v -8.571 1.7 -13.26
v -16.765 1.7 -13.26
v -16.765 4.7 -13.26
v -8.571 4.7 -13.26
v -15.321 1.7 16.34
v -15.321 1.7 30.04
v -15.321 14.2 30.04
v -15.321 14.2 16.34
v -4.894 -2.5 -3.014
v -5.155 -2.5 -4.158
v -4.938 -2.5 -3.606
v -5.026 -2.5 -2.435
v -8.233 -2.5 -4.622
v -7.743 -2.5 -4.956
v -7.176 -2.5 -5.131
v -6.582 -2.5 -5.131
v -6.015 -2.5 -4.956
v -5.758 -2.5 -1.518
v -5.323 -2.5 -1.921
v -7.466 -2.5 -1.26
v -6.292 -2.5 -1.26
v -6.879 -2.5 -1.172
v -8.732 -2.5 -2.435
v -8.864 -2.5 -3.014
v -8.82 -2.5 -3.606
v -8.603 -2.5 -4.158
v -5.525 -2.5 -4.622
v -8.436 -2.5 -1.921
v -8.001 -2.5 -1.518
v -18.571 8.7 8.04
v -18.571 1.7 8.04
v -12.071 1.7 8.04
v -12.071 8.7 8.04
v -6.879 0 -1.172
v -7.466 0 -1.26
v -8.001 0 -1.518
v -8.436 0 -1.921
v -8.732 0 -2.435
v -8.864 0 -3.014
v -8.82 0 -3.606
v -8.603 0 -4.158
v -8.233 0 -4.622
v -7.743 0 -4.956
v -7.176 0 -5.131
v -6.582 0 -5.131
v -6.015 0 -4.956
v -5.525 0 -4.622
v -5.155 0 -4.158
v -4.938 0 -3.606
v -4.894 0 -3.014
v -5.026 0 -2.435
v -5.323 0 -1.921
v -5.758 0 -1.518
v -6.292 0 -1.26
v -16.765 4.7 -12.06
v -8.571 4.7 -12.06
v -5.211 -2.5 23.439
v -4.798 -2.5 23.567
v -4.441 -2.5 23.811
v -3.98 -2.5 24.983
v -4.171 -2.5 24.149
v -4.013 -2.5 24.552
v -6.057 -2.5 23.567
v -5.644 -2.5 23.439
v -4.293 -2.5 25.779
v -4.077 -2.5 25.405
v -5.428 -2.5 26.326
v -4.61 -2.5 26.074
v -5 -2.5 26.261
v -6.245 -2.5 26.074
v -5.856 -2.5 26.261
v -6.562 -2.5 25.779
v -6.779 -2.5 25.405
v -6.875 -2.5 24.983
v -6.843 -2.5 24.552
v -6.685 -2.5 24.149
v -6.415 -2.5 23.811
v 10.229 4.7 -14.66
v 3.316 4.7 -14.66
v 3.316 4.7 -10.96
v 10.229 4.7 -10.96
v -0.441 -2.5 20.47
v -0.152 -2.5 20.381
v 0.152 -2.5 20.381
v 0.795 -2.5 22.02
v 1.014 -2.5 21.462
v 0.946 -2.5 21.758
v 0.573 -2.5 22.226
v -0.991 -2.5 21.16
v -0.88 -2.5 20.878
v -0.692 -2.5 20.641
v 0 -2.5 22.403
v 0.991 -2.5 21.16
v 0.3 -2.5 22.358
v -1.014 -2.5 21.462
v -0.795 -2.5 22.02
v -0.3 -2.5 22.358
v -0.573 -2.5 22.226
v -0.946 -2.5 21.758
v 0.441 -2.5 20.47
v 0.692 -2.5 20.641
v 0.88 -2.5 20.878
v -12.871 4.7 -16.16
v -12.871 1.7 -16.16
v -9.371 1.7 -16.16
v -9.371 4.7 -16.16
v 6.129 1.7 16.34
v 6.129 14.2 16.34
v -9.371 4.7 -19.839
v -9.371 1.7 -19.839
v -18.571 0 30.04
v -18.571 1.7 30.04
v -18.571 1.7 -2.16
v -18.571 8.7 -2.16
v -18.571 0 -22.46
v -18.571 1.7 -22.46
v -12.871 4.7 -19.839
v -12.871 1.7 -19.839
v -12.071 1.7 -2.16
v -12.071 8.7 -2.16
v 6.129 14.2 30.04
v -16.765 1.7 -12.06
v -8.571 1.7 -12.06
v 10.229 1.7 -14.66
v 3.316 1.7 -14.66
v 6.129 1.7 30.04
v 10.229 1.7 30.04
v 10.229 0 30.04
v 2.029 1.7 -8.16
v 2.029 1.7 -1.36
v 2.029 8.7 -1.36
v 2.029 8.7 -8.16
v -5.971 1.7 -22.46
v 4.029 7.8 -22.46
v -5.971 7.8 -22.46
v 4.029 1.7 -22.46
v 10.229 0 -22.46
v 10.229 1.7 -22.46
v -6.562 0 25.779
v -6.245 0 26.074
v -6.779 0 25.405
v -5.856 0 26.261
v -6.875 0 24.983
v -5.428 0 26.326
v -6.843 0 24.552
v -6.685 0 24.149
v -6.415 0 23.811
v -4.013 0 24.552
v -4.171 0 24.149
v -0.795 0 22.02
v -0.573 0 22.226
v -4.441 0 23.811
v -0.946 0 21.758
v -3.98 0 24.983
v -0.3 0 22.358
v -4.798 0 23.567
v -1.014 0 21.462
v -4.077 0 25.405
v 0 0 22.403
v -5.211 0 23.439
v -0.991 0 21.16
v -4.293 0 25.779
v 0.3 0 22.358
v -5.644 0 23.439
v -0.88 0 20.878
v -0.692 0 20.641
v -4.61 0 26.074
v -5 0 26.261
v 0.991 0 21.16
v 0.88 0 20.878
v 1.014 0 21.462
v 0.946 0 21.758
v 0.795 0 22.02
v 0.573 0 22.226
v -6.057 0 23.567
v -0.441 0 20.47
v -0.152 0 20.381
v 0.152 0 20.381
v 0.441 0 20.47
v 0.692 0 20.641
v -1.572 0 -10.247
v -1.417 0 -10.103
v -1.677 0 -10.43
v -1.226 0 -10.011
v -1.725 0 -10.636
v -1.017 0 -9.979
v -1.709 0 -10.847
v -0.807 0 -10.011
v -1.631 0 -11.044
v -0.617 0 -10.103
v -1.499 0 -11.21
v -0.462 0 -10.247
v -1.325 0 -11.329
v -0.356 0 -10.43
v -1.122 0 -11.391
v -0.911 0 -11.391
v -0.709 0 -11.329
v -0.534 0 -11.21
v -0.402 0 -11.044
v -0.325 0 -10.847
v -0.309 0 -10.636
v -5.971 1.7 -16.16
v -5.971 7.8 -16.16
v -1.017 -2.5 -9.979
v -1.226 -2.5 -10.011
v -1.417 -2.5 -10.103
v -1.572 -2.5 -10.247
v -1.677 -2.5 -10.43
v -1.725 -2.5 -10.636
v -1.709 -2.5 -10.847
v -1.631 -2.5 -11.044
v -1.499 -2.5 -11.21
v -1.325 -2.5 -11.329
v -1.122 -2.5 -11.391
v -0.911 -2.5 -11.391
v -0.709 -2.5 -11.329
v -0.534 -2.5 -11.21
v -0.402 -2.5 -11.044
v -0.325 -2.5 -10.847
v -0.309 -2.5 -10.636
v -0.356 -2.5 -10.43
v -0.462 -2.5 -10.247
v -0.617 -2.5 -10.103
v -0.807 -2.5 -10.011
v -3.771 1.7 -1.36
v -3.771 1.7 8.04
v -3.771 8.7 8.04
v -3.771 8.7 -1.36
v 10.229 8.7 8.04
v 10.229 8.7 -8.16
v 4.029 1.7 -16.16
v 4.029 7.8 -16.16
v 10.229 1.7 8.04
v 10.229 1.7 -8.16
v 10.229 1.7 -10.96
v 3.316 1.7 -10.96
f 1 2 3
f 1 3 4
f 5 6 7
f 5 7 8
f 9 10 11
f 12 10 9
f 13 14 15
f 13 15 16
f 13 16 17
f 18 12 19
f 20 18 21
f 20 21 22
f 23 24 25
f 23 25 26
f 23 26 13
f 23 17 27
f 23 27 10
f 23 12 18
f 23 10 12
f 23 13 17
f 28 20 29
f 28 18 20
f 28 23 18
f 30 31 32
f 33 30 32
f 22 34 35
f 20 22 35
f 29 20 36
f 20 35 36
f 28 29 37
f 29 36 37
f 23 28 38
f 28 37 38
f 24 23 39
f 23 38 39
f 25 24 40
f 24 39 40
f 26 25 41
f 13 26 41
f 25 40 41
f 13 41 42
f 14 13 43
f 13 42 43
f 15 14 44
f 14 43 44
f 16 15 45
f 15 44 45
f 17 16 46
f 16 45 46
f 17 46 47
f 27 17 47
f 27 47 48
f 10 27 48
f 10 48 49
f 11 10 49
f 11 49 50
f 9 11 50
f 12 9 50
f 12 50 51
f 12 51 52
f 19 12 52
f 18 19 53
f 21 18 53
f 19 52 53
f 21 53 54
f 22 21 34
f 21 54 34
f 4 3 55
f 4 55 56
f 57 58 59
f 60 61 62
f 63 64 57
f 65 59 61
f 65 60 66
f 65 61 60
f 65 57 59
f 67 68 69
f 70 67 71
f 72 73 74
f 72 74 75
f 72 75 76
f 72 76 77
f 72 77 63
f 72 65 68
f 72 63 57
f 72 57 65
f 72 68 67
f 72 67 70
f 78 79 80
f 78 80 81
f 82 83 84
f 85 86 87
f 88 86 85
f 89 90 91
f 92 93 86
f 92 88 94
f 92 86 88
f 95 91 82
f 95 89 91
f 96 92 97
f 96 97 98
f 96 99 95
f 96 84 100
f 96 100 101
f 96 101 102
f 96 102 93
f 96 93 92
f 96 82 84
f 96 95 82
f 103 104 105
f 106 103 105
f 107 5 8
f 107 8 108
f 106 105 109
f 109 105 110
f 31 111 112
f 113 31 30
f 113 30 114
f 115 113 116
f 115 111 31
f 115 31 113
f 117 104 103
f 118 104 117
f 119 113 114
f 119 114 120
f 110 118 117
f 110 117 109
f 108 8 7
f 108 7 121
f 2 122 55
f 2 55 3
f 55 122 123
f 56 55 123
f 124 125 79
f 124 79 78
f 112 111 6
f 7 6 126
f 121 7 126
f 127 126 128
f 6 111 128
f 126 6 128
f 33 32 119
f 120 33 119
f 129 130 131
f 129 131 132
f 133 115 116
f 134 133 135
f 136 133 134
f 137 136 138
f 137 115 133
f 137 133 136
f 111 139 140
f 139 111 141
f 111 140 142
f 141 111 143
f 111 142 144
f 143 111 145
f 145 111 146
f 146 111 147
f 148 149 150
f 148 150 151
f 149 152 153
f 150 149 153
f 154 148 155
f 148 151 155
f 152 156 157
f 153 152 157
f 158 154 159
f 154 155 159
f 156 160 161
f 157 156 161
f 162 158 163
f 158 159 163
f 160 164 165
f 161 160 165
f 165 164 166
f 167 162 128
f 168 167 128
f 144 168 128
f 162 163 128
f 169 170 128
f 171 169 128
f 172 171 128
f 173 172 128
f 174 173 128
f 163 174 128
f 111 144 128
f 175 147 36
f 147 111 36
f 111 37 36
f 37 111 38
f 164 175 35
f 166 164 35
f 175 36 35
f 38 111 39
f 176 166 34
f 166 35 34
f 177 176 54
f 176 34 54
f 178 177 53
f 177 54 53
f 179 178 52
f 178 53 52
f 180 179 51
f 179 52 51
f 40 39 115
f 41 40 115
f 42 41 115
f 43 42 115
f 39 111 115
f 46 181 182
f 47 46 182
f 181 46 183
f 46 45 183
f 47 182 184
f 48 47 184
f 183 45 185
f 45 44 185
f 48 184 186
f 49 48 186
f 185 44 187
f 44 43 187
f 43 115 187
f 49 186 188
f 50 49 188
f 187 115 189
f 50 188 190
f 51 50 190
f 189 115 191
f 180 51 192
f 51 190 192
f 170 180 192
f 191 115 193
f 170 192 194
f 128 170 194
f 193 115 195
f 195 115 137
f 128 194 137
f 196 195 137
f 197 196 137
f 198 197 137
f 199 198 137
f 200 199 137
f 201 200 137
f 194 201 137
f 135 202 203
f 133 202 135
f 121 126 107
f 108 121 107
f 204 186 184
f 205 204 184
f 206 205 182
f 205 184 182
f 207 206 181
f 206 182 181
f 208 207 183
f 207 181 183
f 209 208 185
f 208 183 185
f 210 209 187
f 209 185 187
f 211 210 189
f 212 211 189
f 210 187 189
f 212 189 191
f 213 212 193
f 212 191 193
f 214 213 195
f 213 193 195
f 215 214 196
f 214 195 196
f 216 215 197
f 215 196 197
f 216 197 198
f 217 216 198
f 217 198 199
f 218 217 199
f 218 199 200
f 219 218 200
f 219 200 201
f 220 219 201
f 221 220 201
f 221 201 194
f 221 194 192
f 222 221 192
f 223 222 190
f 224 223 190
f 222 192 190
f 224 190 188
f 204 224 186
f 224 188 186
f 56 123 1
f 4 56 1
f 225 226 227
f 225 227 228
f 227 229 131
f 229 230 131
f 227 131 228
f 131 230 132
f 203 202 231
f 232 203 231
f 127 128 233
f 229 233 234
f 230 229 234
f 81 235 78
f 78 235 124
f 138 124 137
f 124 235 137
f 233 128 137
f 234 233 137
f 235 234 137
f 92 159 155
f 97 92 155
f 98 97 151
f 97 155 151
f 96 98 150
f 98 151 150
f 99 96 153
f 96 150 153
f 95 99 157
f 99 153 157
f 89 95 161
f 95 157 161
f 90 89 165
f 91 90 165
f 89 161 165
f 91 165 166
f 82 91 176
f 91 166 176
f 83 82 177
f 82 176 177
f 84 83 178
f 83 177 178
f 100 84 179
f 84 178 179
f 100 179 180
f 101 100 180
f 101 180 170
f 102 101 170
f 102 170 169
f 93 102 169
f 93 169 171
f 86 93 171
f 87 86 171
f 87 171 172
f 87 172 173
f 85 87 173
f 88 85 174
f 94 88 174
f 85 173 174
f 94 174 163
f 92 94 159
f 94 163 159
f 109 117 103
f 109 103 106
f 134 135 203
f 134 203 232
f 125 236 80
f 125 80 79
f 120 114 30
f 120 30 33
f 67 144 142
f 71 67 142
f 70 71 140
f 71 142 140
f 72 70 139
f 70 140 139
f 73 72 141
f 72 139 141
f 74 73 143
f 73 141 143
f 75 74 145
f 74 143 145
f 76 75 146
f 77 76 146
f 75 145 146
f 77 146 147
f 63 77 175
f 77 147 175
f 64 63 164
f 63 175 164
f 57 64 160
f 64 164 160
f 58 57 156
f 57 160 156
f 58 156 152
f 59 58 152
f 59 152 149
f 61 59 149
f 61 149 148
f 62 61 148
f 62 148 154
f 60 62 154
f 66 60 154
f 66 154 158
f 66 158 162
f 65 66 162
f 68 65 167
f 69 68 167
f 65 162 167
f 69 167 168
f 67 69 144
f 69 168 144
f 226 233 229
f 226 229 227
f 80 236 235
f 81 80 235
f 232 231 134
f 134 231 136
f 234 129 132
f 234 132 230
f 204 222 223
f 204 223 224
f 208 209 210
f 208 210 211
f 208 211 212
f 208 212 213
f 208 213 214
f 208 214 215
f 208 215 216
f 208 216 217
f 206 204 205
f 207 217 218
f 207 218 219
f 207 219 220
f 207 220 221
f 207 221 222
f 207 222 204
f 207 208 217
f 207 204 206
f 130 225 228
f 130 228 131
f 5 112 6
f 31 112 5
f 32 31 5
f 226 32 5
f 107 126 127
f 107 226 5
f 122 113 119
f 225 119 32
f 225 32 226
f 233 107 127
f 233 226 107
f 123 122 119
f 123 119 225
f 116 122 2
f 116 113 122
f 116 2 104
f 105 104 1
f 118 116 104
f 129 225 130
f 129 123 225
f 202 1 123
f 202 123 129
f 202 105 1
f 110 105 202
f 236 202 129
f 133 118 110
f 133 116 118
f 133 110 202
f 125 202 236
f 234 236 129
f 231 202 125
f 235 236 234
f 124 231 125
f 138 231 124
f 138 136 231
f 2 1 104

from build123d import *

# Parameters (mm, degrees)
SZKIC1_W                    = 28.8
SZKIC1_H                    = 52.5
DODANIE_WYCI_GNI_CIE1_DEPTH = 1.7
SZKIC2_W                    = 21.45
SZKIC2_H                    = 13.7
DODANIE_WYCI_GNI_CIE2_DEPTH = 12.5
SZKIC3_W                    = 10
SZKIC3_H                    = 6.3
DODANIE_WYCI_GNI_CIE3_DEPTH = 6.1
SZKIC4_W                    = 6.912979227
SZKIC4_H                    = 3.7
DODANIE_WYCI_GNI_CIE4_DEPTH = 3
SZKIC5_R                    = 1.451396222
SZKIC5_R_2                  = 1.016690736
SZKIC5_R_3                  = 1.990845458
SZKIC5_R_4                  = 0.709805555
DODANIE_WYCI_GNI_CIE5_DEPTH = 2.5
SZKIC6_W                    = 3.5
SZKIC6_H                    = 3.678360942
DODANIE_WYCI_GNI_CIE6_DEPTH = 3
SZKIC7_W                    = 8.193889987
SZKIC7_H                    = 1.2
DODANIE_WYCI_GNI_CIE7_DEPTH = 3
SZKIC8_W                    = 6.5
SZKIC8_H                    = 10.2
DODANIE_WYCI_GNI_CIE8_DEPTH = 7


with BuildPart() as part:
    # Szkic1 → Dodanie-wyciągnięcie1 (new body)
    with BuildSketch(Plane(origin=(0, 0, 0), x_dir=(1, 0, 0), z_dir=(0, 1, 0))):
        with Locations((-4.171428571, -3.78968254)):
            Rectangle(SZKIC1_W, SZKIC1_H)
    extrude(amount=DODANIE_WYCI_GNI_CIE1_DEPTH)

    # Szkic2 → Dodanie-wyciągnięcie2 (add)
    with BuildSketch(Plane(origin=(0, 1.7, 0), x_dir=(1, 0, 0), z_dir=(0, 1, 0))):
        with Locations((-4.596428571, -23.18968254)):
            Rectangle(SZKIC2_W, SZKIC2_H)
    extrude(amount=DODANIE_WYCI_GNI_CIE2_DEPTH)

    # Szkic3 → Dodanie-wyciągnięcie3 (add)
    with BuildSketch(Plane(origin=(0, 1.7, 0), x_dir=(1, 0, 0), z_dir=(0, 1, 0))):
        with Locations((-0.971428571, 19.31031746)):
            Rectangle(SZKIC3_W, SZKIC3_H)
    extrude(amount=DODANIE_WYCI_GNI_CIE3_DEPTH)

    # Szkic4 → Dodanie-wyciągnięcie4 (add)
    with BuildSketch(Plane(origin=(0, 1.7, 0), x_dir=(1, 0, 0), z_dir=(0, 1, 0))):
        with Locations((6.772081815, 12.81031746)):
            Rectangle(SZKIC4_W, SZKIC4_H)
    extrude(amount=DODANIE_WYCI_GNI_CIE4_DEPTH)

    # Szkic5 → Dodanie-wyciągnięcie5 (add)
    with BuildSketch(Plane.XZ):
        with Locations(Location((-5.427705737, 24.874487644, 0), (0, 0, 90))):
            Circle(SZKIC5_R)
        with Locations(Location((0, 21.386133845, 0), (0, 0, 90))):
            Circle(SZKIC5_R_2)
        with Locations(Location((-6.879101959, -3.162519717, 0), (0, 0, 90))):
            Circle(SZKIC5_R_3)
        with Locations(Location((-1.016690736, -10.689240837, 0), (0, 0, 90))):
            Circle(SZKIC5_R_4)
    extrude(amount=DODANIE_WYCI_GNI_CIE5_DEPTH)

    # Szkic6 → Dodanie-wyciągnięcie6 (add)
    with BuildSketch(Plane(origin=(0, 1.7, 0), x_dir=(1, 0, 0), z_dir=(0, 1, 0))):
        with Locations((-11.121428571, 17.999497931)):
            Rectangle(SZKIC6_W, SZKIC6_H)
    extrude(amount=DODANIE_WYCI_GNI_CIE6_DEPTH)

    # Szkic7 → Dodanie-wyciągnięcie7 (add)
    with BuildSketch(Plane(origin=(0, 1.7, 0), x_dir=(1, 0, 0), z_dir=(0, 1, 0))):
        with Locations((-12.668373565, 12.66031746)):
            Rectangle(SZKIC7_W, SZKIC7_H)
    extrude(amount=DODANIE_WYCI_GNI_CIE7_DEPTH)

    # Szkic8 → Dodanie-wyciągnięcie8 (add)
    with BuildSketch(Plane(origin=(0, 1.7, 0), x_dir=(1, 0, 0), z_dir=(0, 1, 0))):
        with Locations((-15.321428571, -2.93968254)):
            Rectangle(SZKIC8_W, SZKIC8_H)
        Polygon((10.228571429, -8.03968254), (-3.771428571, -8.03968254), (-3.771428571, 1.36031746), (2.028571429, 1.36031746), (2.028571429, 8.16031746), (10.228571429, 8.16031746), align=None)
    extrude(amount=DODANIE_WYCI_GNI_CIE8_DEPTH)


solid = part.part
